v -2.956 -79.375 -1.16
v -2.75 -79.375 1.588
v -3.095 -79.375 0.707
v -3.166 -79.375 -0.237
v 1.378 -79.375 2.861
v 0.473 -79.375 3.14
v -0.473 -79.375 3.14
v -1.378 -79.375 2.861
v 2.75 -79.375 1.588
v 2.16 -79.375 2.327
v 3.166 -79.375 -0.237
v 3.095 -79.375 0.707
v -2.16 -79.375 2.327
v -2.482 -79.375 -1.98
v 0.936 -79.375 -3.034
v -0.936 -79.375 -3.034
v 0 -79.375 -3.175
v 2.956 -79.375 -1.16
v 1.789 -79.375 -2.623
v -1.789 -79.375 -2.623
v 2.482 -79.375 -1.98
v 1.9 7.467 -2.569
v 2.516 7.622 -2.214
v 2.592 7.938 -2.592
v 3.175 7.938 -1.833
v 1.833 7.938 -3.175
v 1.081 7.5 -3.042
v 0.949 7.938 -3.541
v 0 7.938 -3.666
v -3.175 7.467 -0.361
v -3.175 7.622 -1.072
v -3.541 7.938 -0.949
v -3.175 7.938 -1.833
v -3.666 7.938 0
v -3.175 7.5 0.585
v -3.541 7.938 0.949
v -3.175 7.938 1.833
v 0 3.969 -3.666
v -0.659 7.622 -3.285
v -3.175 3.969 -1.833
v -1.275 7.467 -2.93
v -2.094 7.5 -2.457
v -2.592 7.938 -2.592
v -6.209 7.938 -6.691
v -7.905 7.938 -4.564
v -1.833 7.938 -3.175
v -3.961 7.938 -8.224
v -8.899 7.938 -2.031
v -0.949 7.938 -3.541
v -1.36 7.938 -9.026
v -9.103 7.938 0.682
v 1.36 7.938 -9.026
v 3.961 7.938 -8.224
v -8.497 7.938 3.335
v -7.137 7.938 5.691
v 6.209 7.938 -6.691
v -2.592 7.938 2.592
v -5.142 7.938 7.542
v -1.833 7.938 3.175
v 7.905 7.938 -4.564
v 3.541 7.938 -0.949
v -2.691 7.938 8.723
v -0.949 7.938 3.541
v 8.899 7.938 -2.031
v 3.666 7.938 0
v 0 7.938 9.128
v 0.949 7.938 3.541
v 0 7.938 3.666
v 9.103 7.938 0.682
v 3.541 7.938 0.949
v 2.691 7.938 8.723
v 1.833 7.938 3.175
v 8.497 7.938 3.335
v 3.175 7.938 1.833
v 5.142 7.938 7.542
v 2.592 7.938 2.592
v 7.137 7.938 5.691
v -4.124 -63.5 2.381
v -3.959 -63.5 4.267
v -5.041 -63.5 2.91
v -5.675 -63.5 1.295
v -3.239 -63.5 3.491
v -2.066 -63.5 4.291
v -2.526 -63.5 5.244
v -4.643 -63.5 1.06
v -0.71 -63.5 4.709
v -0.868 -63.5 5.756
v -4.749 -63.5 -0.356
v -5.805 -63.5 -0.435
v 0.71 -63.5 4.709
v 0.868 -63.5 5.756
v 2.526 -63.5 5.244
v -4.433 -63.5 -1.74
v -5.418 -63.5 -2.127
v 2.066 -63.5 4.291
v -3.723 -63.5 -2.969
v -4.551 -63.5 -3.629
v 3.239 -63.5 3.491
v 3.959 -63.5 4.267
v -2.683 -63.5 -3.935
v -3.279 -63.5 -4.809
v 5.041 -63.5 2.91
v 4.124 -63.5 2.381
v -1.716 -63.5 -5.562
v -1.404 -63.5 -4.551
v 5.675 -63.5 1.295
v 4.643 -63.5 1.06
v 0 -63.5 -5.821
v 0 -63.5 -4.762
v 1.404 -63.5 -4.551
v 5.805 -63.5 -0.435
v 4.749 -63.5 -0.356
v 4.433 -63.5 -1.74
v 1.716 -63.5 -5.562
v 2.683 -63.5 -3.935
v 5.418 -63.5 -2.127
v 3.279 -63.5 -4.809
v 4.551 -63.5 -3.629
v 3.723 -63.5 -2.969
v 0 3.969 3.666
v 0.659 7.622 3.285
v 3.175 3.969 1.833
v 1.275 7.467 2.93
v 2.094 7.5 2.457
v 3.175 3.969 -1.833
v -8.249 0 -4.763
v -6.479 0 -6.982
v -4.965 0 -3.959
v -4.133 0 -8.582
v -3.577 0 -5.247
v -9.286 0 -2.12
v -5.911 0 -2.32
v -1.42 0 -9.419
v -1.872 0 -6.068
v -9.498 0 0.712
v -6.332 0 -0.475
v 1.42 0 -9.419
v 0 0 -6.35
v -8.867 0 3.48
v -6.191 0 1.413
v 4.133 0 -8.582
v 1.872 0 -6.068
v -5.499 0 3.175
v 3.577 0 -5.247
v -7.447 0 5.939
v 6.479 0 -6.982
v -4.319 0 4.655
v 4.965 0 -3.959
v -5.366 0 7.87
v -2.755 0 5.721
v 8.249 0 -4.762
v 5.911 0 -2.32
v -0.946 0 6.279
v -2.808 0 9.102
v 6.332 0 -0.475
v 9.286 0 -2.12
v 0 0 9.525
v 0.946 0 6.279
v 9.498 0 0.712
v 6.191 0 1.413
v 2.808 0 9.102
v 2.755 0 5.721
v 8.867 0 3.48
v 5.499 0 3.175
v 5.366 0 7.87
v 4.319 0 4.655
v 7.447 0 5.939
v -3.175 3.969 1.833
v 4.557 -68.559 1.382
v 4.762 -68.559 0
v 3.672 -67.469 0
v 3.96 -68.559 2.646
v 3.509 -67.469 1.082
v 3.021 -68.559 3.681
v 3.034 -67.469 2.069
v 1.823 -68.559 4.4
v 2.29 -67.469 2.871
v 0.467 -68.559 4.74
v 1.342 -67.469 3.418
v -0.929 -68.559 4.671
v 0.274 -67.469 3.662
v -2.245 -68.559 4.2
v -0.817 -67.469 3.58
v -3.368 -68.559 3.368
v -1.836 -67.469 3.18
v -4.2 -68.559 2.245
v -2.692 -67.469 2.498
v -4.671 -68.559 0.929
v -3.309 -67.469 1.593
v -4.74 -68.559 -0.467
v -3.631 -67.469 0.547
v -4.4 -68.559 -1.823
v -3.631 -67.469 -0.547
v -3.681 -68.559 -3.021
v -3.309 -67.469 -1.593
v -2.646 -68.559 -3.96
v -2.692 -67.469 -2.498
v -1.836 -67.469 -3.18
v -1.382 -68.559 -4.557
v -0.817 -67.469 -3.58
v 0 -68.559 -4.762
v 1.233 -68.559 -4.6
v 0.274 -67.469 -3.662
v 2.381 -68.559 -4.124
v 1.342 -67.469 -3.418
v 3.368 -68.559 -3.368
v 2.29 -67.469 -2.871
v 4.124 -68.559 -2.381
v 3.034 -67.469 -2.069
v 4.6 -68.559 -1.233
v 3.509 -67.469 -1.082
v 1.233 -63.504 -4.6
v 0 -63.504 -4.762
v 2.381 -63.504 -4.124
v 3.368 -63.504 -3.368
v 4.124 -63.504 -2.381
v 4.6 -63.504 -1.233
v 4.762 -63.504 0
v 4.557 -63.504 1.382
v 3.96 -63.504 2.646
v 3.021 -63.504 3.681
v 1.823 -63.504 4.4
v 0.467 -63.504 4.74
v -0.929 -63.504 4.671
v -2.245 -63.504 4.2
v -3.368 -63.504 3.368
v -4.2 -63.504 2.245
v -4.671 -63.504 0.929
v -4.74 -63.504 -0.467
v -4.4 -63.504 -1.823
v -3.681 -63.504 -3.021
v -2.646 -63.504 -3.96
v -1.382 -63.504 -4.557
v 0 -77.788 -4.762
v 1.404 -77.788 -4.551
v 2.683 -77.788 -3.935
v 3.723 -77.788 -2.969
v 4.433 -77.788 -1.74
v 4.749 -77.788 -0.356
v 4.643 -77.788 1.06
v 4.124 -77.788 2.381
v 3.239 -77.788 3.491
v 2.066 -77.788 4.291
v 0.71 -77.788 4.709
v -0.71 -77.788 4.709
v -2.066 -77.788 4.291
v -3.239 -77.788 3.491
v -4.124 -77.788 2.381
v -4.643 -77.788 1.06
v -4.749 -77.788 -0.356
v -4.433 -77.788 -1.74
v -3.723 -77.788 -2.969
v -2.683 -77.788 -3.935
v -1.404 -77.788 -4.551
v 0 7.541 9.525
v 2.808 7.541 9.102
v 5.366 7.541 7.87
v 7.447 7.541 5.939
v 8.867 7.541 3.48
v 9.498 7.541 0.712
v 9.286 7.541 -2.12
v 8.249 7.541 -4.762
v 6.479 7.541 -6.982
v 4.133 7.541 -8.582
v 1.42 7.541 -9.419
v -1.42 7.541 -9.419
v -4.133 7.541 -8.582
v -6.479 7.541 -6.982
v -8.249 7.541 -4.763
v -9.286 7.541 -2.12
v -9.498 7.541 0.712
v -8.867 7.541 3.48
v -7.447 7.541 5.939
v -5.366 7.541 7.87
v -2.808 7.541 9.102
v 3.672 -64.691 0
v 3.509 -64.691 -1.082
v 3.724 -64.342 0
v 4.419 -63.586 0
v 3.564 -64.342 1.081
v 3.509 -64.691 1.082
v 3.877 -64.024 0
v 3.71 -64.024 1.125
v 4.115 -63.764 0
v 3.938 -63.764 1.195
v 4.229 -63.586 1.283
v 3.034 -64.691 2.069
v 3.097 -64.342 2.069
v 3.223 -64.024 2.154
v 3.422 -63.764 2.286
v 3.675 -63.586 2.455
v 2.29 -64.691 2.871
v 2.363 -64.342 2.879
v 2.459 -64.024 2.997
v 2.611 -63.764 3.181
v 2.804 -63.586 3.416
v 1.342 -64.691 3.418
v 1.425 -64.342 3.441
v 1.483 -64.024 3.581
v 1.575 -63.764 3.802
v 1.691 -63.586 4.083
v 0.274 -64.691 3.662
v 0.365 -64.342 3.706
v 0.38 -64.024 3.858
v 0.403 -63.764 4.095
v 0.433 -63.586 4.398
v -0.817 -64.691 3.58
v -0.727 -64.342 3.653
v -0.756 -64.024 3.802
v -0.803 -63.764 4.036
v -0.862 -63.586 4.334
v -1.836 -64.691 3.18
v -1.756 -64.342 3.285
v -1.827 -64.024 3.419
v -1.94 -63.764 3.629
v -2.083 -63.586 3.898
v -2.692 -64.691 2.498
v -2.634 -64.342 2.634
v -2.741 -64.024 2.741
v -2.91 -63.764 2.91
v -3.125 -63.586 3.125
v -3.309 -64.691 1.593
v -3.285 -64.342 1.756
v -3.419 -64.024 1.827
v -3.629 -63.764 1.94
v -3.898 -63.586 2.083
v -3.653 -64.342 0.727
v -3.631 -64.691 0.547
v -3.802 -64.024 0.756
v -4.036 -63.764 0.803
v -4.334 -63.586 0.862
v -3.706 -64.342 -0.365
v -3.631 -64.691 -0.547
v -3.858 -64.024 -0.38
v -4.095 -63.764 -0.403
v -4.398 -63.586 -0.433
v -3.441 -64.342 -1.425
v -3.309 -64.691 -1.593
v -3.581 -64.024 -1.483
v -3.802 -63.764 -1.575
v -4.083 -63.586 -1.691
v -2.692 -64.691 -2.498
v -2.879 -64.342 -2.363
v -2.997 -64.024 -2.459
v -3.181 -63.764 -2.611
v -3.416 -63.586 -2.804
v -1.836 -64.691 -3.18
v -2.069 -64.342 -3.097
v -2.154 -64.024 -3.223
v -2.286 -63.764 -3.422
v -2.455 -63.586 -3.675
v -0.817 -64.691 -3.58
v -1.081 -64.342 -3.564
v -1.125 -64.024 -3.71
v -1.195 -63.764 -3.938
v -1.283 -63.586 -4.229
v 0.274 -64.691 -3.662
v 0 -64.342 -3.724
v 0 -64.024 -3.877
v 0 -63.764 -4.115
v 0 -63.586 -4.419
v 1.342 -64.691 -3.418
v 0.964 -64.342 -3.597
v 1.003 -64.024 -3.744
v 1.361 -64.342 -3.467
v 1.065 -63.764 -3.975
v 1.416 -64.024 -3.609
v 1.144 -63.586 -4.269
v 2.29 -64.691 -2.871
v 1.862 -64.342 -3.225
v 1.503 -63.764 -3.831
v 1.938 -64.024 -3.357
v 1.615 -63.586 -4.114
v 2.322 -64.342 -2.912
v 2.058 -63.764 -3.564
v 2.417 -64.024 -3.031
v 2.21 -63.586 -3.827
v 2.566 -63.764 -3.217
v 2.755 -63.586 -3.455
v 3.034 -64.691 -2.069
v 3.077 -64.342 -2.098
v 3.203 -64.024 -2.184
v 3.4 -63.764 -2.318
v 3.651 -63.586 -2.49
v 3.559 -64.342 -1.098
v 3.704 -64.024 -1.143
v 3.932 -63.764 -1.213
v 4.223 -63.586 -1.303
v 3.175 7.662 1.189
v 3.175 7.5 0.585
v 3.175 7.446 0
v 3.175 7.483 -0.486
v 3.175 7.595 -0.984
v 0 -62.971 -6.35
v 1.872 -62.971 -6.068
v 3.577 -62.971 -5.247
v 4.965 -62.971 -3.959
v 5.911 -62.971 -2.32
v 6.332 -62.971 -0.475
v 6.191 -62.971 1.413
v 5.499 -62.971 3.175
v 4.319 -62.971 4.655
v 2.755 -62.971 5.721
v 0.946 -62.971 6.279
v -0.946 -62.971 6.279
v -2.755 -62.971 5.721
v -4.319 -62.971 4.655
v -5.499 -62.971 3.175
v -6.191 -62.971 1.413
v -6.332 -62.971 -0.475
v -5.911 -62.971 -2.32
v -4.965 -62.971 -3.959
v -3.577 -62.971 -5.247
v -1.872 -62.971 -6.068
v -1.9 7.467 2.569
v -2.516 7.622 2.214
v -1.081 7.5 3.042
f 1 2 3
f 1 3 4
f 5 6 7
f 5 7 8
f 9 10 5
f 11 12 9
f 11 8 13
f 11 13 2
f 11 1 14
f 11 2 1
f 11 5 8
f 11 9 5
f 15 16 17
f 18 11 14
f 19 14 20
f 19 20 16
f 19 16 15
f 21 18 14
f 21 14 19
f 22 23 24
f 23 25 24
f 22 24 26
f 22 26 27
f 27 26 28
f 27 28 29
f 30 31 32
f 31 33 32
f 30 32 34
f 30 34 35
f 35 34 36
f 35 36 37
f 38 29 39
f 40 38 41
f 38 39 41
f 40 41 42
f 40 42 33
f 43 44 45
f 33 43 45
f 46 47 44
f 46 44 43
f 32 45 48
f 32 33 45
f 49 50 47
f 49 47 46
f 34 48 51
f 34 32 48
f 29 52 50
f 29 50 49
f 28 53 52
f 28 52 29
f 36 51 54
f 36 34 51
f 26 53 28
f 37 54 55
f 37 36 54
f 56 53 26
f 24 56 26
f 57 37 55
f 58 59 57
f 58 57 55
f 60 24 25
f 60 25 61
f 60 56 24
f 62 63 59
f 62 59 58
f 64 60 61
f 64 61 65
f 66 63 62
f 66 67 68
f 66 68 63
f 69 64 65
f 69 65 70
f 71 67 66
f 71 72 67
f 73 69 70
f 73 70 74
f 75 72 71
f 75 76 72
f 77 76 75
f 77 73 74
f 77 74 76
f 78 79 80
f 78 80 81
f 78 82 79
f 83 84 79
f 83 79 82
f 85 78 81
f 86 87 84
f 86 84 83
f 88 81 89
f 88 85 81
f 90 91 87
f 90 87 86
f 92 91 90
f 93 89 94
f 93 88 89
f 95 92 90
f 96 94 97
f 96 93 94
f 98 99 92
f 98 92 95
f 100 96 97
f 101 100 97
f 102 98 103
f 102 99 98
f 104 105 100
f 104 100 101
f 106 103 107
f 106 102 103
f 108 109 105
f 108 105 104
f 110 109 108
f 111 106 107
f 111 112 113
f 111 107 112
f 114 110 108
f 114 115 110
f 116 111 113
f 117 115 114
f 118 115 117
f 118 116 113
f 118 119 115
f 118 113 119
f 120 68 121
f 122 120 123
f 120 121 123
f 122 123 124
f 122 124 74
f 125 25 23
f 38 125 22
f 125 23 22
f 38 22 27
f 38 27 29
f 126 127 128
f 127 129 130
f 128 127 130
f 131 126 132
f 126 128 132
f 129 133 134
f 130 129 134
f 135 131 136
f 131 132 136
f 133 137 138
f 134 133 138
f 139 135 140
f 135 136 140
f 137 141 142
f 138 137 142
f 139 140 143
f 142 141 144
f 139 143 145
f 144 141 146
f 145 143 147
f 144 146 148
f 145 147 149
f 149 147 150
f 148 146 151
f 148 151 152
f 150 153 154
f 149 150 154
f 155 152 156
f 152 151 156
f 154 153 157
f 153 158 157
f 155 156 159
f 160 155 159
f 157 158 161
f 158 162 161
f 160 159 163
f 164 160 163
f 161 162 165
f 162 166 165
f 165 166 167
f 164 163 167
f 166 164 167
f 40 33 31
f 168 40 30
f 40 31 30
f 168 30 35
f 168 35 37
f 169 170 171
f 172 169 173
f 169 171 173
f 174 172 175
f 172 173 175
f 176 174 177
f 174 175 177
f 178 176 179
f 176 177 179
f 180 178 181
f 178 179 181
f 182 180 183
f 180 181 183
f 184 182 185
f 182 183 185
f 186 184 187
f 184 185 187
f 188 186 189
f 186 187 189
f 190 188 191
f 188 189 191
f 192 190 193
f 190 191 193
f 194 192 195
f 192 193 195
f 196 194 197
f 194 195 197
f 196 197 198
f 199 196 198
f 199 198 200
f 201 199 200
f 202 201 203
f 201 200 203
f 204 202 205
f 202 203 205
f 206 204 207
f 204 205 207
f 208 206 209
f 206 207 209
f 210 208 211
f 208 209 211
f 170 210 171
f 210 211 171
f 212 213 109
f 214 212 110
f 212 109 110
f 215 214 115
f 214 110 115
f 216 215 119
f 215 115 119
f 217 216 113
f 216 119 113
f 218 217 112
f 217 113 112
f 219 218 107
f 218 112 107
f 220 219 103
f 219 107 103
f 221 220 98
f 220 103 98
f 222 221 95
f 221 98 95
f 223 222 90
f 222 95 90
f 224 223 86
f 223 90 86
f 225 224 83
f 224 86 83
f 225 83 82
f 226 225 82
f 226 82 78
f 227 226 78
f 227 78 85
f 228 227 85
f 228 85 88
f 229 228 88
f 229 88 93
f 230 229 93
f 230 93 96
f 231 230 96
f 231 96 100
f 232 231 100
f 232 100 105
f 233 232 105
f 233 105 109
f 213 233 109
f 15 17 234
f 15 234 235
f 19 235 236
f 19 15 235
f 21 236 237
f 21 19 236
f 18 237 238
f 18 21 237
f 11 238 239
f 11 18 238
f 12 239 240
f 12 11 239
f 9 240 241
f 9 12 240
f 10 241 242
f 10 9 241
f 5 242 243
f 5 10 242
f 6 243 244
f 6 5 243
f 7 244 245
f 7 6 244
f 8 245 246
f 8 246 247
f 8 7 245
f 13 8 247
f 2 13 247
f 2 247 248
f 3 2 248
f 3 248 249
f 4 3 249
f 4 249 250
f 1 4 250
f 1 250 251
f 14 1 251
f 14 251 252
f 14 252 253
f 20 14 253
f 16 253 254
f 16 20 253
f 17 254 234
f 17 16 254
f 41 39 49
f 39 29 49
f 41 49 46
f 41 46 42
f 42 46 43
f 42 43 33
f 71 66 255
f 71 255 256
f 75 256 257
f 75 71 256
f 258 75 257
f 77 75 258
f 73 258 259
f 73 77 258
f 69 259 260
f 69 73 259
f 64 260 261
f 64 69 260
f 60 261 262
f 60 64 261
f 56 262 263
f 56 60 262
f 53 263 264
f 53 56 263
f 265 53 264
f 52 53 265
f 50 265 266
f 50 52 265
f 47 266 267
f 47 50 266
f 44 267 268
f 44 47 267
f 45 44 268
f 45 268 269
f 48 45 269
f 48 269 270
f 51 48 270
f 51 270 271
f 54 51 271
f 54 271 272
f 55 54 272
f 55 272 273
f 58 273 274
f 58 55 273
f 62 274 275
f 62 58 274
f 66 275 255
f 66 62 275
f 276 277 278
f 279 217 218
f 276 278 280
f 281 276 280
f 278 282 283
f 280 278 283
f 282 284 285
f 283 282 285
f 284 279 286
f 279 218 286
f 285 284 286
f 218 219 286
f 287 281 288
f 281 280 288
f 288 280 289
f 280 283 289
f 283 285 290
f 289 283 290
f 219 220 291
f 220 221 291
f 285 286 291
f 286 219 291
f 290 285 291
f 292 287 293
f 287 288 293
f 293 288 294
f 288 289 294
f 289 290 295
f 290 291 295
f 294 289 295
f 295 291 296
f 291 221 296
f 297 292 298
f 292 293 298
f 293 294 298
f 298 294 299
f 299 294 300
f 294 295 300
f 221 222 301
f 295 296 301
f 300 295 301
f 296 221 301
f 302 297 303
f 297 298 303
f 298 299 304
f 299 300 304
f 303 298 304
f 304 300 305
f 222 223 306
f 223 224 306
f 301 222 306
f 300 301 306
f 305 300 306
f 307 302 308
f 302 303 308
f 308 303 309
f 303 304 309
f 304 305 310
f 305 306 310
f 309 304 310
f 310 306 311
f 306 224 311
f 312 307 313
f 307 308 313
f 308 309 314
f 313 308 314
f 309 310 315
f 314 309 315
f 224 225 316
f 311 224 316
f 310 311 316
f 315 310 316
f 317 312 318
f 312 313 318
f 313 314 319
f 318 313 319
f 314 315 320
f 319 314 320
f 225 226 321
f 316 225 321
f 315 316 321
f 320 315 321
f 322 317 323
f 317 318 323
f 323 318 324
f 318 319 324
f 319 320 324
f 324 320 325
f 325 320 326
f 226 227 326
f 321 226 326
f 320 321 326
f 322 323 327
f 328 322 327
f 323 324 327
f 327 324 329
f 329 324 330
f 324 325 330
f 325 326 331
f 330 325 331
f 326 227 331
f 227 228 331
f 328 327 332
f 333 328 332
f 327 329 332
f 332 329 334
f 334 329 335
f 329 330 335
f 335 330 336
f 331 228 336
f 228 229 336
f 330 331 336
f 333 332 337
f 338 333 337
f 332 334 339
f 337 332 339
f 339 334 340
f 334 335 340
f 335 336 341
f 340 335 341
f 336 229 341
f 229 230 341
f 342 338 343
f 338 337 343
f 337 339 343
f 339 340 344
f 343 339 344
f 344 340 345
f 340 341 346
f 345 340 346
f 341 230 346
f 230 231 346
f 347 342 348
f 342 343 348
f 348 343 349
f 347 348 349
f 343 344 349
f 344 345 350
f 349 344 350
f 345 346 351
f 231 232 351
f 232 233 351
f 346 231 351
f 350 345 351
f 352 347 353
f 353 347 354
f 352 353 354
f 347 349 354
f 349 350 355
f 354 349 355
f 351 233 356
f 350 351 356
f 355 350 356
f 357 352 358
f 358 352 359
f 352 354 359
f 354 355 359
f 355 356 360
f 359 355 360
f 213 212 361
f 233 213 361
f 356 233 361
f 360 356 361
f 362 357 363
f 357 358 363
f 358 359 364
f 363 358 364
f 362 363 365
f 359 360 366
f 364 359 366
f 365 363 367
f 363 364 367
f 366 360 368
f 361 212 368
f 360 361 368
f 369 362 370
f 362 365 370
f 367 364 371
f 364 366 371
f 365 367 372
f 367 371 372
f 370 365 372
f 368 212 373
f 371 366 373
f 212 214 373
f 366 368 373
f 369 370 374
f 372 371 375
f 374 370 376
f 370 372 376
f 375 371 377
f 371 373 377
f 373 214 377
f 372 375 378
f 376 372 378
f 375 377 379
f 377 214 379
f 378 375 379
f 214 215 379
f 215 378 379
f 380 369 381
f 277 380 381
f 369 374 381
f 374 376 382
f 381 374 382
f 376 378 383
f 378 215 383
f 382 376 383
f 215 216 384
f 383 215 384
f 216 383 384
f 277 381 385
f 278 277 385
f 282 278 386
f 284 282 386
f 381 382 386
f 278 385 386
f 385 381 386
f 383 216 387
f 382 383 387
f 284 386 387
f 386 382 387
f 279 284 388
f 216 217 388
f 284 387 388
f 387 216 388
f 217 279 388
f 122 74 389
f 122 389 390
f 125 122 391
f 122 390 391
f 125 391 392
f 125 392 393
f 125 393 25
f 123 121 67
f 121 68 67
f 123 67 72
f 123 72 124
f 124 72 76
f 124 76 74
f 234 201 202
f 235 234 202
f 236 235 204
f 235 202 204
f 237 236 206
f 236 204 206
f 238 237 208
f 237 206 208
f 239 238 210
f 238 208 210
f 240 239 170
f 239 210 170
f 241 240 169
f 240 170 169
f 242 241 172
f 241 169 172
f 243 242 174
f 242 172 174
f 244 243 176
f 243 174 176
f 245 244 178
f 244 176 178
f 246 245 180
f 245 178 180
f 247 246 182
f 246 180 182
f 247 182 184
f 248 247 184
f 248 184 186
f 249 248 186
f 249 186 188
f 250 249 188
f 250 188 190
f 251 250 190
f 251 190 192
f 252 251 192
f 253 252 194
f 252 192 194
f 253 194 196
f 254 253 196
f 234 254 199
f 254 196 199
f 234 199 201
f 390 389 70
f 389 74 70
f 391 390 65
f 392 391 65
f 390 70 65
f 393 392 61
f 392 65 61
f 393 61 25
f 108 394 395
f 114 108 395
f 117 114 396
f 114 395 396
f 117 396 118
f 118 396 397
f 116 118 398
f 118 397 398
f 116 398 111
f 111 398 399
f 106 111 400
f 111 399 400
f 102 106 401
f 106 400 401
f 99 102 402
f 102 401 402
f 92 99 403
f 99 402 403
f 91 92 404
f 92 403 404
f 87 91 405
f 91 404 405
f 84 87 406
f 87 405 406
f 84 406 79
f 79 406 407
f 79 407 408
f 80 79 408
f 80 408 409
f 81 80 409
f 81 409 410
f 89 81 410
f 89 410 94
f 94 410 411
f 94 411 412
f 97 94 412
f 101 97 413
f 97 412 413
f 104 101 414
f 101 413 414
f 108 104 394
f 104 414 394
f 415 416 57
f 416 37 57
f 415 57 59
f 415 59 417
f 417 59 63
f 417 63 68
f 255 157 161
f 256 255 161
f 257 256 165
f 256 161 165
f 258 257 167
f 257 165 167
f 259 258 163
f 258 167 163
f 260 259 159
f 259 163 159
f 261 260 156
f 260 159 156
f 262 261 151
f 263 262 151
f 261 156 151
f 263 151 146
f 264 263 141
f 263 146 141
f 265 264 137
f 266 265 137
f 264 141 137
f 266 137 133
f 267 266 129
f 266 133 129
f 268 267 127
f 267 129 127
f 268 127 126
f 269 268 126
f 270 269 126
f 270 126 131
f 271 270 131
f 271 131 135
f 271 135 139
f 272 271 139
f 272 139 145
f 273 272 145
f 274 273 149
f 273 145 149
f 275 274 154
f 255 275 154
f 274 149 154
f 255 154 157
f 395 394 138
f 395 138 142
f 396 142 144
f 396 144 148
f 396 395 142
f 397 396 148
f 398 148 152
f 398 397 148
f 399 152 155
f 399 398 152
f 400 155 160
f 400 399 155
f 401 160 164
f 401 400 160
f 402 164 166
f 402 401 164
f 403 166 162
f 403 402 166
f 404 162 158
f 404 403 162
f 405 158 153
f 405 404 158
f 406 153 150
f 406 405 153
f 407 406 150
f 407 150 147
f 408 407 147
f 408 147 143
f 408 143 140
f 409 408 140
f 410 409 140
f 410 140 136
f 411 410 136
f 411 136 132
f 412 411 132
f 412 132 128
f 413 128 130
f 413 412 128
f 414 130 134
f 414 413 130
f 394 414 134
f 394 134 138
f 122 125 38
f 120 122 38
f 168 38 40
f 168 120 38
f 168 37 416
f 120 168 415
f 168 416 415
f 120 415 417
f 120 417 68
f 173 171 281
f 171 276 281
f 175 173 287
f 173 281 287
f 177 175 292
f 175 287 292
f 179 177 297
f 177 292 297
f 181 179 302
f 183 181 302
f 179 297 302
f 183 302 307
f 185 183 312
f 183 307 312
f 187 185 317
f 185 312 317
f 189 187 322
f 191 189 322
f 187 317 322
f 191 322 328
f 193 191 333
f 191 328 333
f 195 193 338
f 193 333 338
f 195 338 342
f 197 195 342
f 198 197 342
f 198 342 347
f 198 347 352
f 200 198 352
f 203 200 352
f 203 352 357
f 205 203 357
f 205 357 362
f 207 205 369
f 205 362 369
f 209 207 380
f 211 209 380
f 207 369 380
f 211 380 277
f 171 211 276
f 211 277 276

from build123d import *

# Parameters (mm, degrees)
SKETCH1_R          = 9.525
EXTRUDE1_DEPTH     = 7.9375
CUT_EXTRUDE1_DEPTH = 3.96875
SKETCH18_R         = 3.666174209
CUT_EXTRUDE4_DEPTH = 1.322916667
CUT_EXTRUDE4_DRAFT = -45
SKETCH4_R          = 6.35
EXTRUDE2_DEPTH     = 63.5
SKETCH5_R          = 4.7625
EXTRUDE3_DEPTH     = 15.875
CHAMFER1_SIZE      = 1.5875
CHAMFER2_SIZE      = 0.529166667
CHAMFER3_SIZE      = 0.396875


with BuildPart() as part:
    # Sketch1 → Extrude1 (new body)
    with BuildSketch(Plane(origin=(0, 0, 0), x_dir=(1, 0, 0), z_dir=(0, 1, 0))):
        Circle(SKETCH1_R)
    extrude(amount=EXTRUDE1_DEPTH)

    # Sketch2 → Cut-Extrude1 (cut)
    with BuildSketch(Plane(origin=(0, 7.9375, 0), x_dir=(-1, 0, 0), z_dir=(0, 1, 0))):
        Polygon((0, -3.666174209), (3.175, -1.833087105), (3.175, 1.833087105), (0, 3.666174209), (-3.175, 1.833087105), (-3.175, -1.833087105), align=None)
    extrude(amount=-CUT_EXTRUDE1_DEPTH, mode=Mode.SUBTRACT)


with BuildPart() as cut_extrude4_tool:
    # Sketch18 → Cut-Extrude4 (with draft: the straight prism first)
    with BuildSketch(Plane(origin=(0, 7.9375, 0), x_dir=(1, 0, 0), z_dir=(0, 1, 0))):
        Circle(SKETCH18_R)
    extrude(amount=-CUT_EXTRUDE4_DEPTH)
    # Cut-Extrude4: the draft: its side faces are tilted about the plane it starts from
    cut_extrude4_sides = [cut_extrude4_tool.faces().sort_by_distance(p)[0] for p in [
        (-3.666174209, 7.276041667, 0),
    ]]
    draft(cut_extrude4_sides, Plane(origin=(0, 7.9375, 0), x_dir=(1, 0, 0), z_dir=(0, 1, 0)), CUT_EXTRUDE4_DRAFT)


with BuildPart() as part_1:
    add(part.part)

    # Cut-Extrude4: cut by cut_extrude4_tool
    add(cut_extrude4_tool.part, mode=Mode.SUBTRACT)

    # Sketch4 → Extrude2 (add)
    with BuildSketch(Plane.XZ.offset(63.5)):
        Circle(SKETCH4_R)
    extrude(amount=-EXTRUDE2_DEPTH)

    # Sketch5 → Extrude3 (add)
    with BuildSketch(Plane.XZ.offset(63.5)):
        Circle(SKETCH5_R)
    extrude(amount=EXTRUDE3_DEPTH)

    # Chamfer1
    chamfer1_edges = [part_1.edges().sort_by_distance(p)[0] for p in [
        (-4.7625, -79.375, 0),
    ]]
    chamfer(chamfer1_edges, length=CHAMFER1_SIZE)

    # Sketch17 → Cut-Revolve1 (revolve, cut)
    with BuildSketch(Plane.XY):
        with BuildLine():
            Line((4.862800608, -63.5), (6.35, -63.5))
            Line((6.35, -63.5), (6.35, -67.46875))
            Line((6.35, -67.46875), (6.35, -70.146574392))
            Line((6.35, -70.146574392), (3.672175608, -67.46875))
            Line((3.672175608, -67.46875), (3.672175608, -64.690625))
            ThreePointArc((3.672175608, -64.690625), (4.020901597, -63.848725989), (4.862800608, -63.5))
        make_face()
    revolve(axis=Axis((0, 0, 0), (0, -1, 0)), mode=Mode.SUBTRACT)

    # Chamfer2
    chamfer2_edges = [part_1.edges().sort_by_distance(p)[0] for p in [
        (-6.35, -63.5, 0),
    ]]
    chamfer(chamfer2_edges, length=CHAMFER2_SIZE)

    # Chamfer3
    chamfer3_edges = [part_1.edges().sort_by_distance(p)[0] for p in [
        (-9.525, 7.9375, 0),
    ]]
    chamfer(chamfer3_edges, length=CHAMFER3_SIZE)


solid = part_1.part
